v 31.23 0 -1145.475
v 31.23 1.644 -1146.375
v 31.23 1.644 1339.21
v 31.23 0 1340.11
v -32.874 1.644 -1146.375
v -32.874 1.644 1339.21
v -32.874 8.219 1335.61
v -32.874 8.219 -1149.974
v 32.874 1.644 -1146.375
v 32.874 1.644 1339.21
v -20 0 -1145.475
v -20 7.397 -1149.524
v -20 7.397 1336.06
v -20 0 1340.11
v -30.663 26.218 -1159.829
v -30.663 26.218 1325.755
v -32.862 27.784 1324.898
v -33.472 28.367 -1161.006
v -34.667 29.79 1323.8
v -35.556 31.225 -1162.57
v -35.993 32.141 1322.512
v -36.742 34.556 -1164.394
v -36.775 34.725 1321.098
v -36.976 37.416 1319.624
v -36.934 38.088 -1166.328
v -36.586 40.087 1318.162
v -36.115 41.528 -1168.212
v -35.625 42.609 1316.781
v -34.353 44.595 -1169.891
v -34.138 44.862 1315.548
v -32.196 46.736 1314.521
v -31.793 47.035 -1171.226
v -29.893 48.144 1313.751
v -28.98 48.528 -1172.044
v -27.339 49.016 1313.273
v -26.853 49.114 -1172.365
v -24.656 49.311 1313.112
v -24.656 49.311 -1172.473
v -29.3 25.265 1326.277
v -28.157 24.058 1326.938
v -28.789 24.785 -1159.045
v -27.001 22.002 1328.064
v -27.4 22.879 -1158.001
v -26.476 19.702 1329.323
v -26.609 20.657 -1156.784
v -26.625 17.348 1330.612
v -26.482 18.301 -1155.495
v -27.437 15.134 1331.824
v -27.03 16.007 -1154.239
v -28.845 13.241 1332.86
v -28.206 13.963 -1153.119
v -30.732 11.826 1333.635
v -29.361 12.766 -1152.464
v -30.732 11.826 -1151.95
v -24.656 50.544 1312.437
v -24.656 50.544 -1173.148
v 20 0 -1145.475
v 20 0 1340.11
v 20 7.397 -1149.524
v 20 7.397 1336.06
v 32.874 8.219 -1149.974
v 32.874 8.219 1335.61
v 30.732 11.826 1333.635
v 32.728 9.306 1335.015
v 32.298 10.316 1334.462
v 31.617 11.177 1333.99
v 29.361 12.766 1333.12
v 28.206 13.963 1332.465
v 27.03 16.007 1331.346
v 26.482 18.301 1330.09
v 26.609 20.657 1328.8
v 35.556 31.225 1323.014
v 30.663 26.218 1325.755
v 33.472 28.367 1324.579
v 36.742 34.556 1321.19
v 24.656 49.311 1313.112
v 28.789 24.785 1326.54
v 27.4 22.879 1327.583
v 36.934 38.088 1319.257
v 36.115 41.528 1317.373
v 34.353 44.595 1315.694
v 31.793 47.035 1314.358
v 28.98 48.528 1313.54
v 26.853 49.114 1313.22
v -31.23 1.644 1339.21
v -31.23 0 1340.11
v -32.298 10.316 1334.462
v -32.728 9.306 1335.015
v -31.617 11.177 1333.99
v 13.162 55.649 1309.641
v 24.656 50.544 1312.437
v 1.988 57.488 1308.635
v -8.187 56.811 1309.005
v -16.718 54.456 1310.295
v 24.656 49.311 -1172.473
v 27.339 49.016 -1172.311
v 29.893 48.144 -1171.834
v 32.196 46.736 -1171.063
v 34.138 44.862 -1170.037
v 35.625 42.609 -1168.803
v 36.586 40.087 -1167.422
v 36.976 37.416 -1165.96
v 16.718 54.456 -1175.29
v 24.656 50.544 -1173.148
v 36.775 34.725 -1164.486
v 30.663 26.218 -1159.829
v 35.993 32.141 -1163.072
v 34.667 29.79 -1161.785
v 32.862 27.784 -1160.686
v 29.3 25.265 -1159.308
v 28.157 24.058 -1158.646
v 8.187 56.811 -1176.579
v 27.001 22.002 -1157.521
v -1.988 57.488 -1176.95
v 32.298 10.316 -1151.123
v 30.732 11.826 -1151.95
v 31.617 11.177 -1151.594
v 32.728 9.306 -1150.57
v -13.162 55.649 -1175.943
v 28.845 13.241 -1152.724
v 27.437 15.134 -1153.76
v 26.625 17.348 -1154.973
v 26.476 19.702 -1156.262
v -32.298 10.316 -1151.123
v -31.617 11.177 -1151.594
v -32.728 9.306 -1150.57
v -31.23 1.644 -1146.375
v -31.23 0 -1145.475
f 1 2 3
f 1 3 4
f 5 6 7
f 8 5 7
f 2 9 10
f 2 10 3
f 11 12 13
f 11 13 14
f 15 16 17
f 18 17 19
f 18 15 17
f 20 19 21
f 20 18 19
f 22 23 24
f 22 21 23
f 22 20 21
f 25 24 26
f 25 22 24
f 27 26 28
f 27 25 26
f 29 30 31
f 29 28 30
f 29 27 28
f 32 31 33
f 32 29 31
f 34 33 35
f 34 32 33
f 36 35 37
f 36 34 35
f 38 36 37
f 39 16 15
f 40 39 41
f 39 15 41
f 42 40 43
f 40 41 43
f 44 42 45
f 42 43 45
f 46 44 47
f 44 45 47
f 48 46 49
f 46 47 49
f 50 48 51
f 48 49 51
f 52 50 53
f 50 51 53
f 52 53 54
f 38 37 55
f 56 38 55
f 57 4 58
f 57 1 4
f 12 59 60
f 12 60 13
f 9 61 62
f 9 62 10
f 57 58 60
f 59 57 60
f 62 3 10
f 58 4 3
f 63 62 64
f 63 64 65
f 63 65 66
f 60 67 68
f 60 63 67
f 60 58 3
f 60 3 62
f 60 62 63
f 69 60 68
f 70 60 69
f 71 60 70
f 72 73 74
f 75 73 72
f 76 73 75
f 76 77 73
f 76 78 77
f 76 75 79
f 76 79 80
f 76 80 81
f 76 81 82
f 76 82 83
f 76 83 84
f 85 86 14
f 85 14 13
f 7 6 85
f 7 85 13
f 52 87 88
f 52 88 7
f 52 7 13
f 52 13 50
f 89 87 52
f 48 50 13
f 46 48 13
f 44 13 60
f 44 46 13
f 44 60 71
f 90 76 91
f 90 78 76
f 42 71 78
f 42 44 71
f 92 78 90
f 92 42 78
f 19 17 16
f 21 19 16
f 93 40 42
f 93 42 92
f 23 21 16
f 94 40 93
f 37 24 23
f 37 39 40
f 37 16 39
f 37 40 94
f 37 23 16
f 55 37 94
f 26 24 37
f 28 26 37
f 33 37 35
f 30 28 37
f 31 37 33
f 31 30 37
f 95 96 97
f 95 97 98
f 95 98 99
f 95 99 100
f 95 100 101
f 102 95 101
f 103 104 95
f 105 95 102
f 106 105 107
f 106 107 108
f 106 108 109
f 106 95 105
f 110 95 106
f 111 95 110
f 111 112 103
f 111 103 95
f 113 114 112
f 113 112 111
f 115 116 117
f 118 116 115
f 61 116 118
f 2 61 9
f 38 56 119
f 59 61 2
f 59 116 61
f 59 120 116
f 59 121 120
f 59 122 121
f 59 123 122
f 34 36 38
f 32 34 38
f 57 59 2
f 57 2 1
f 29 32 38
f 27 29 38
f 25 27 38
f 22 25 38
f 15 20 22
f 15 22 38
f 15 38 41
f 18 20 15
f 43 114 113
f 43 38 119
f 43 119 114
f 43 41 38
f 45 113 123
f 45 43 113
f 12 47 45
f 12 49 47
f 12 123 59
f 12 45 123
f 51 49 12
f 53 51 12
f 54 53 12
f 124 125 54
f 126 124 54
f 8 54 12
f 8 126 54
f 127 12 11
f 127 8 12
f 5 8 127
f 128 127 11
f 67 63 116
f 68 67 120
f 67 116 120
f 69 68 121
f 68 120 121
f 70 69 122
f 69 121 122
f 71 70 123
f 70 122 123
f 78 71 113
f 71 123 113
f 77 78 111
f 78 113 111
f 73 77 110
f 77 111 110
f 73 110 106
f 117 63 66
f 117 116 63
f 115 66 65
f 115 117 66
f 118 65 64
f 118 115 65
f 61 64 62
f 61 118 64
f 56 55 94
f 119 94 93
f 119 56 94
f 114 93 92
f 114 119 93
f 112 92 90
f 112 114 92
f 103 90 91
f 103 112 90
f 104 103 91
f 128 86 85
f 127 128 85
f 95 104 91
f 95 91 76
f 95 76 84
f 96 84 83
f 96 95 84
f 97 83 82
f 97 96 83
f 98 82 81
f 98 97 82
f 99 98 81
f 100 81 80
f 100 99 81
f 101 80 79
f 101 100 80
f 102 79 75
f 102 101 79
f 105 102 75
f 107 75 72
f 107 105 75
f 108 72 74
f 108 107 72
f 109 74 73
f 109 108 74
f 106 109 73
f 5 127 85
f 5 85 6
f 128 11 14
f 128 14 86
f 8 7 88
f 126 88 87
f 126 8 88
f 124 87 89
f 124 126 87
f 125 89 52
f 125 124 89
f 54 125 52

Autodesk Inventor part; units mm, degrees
sketch "Поручень" plane through (0, 0, 0) normal (0, 0, 1) x (1, 0, 0)
  line L0 (20.3655, -7.6059) -> (20.3655, -0.2092)
  line L1 (20.3655, -0.2092) -> (-19.6345, -0.2092)
  line L2 (-19.6345, -0.2092) -> (-19.6345, -7.6059)
  line L3 (-19.6345, -7.6059) -> (-30.865, -7.6059)
  line L4 (-30.865, -7.6059) -> (-30.865, -5.9622)
  line L5 (-30.865, -5.9622) -> (-32.5087, -5.9622)
  line L6 (-32.5087, -5.9622) -> (-32.5087, 0.6126)
  arc A0 (-30.367, 4.2203) -> (-32.5087, 0.6126) centre (-28.3995, 0.6126) ccw
  arc A1 (-30.367, 4.2203) -> (-30.2973, 18.6123) centre (-34.302, 11.4355) ccw
  arc A2 (-24.2902, 41.7054) -> (-30.2973, 18.6123) centre (-24.2902, 29.3776) ccw
  line L7 (-24.2902, 41.7054) -> (-24.2902, 42.9382)
  arc A3 (25.0211, 42.9382) -> (-24.2902, 42.9382) centre (0.3655, 2.9211) ccw
  line L8 (25.0211, 42.9382) -> (25.0211, 41.7054)
  arc A4 (31.0282, 18.6123) -> (25.0211, 41.7054) centre (25.0211, 29.3776) ccw
  arc A5 (31.0282, 18.6123) -> (31.0979, 4.2203) centre (35.033, 11.4355) ccw
  arc A6 (33.2397, 0.6126) -> (31.0979, 4.2203) centre (29.1304, 0.6126) ccw
  line L9 (33.2397, 0.6126) -> (33.2397, -5.9622)
  line L10 (33.2397, -5.9622) -> (31.596, -5.9622)
  line L11 (31.596, -5.9622) -> (31.596, -7.6059)
  line L12 (31.596, -7.6059) -> (20.3655, -7.6059)
  point P0 (0.3655, -0.2092)
  point P1 (0.3655, -7.6059)
sketch "Эскиз" plane through (0, 0, 0) normal (0, 0, 1) x (1, 0, 0)
  line L0 (20, 0) -> (20, 7.3967)
  line L1 (20, 7.3967) -> (-20, 7.3967)
  line L2 (-20, 7.3967) -> (-20, 0)
  line L3 (-20, 0) -> (-31.2305, 0)
  line L4 (-31.2305, 0) -> (-31.2305, 1.6437)
  line L5 (-31.2305, 1.6437) -> (-32.8742, 1.6437)
  line L6 (-32.8742, 1.6437) -> (-32.8742, 8.2186)
  arc A0 (-30.7325, 11.8262) -> (-32.8742, 8.2186) centre (-28.7649, 8.2186) ccw
  arc A1 (-30.7325, 11.8262) -> (-30.6628, 26.2183) centre (-34.6675, 19.0415) ccw
  arc A2 (-24.6557, 49.3113) -> (-30.6628, 26.2183) centre (-24.6557, 36.9835) ccw
  line L7 (-24.6557, 49.3113) -> (-24.6557, 50.5441)
  arc A3 (24.6557, 50.5441) -> (-24.6557, 50.5441) centre (0, 10.527) ccw
  line L8 (24.6557, 50.5441) -> (24.6557, 49.3113)
  arc A4 (30.6628, 26.2183) -> (24.6557, 49.3113) centre (24.6557, 36.9835) ccw
  arc A5 (30.6628, 26.2183) -> (30.7325, 11.8262) centre (34.6675, 19.0415) ccw
  arc A6 (32.8742, 8.2186) -> (30.7325, 11.8262) centre (28.7649, 8.2186) ccw
  line L9 (32.8742, 8.2186) -> (32.8742, 1.6437)
  line L10 (32.8742, 1.6437) -> (31.2305, 1.6437)
  line L11 (31.2305, 1.6437) -> (31.2305, 0)
  line L12 (31.2305, 0) -> (20, 0)
  point P0 (0, 0)
ref_plane "Начальная плоскость" through (0, 0, -1176.9727) normal (0, 0, 1) x (1, 0, 0)
ref_plane "РабПлоскость2" through (0, 0, 1691.8665) normal (0, 0, 1) x (1, 0, 0)
extrude "Тело" add sketch "Эскиз" along normal up to surface (2517.0825 mm away) from surface at -1176.9727
ref_plane "Конечная плоскость" through (0, 0, 1340.1098) normal (0, 0, 1) x (1, 0, 0)
ref_plane "РабПлоскость4" through (178.641, -785.005, 1769.9053) normal (0, 0.4802388, 0.8771378) x (1, 0, 0)
split "Разделение1" plane through (178.641, -785.005, 1769.9053) removes the side toward (0, 0.4802388, 0.8771378)
ref_plane "РабПлоскость5" through (88.641, -691.7426, -766.7409) normal (0, -0.4802388, -0.8771378) x (1, 0, 0)
split "Разделение2" plane through (88.641, -691.7426, -766.7409) removes the side toward (0, -0.4802388, -0.8771378)
equation "\"ШИРИНА\" = 75"
equation "\"ТОЛЩВЫС\" = 58"
equation "\"d0\" = -G_OFFSET_START"
equation "\"СЕЧЕНИЕ_СМЕЩ\" = 0"
equation "\"G_OFFSET_END\" = -351.75672"
equation "\"d4\" = ДЛИНА + G_OFFSET_END"
equation "\"G_OFFSET_START\" = 1176.97268"
equation "\"G_L\" = ДЛИНА + G_OFFSET_START + G_OFFSET_END"
equation "\"ДЛИНА\" = 1691.866499"
properties part number "Поручень" material "Древесина (дуб)"
